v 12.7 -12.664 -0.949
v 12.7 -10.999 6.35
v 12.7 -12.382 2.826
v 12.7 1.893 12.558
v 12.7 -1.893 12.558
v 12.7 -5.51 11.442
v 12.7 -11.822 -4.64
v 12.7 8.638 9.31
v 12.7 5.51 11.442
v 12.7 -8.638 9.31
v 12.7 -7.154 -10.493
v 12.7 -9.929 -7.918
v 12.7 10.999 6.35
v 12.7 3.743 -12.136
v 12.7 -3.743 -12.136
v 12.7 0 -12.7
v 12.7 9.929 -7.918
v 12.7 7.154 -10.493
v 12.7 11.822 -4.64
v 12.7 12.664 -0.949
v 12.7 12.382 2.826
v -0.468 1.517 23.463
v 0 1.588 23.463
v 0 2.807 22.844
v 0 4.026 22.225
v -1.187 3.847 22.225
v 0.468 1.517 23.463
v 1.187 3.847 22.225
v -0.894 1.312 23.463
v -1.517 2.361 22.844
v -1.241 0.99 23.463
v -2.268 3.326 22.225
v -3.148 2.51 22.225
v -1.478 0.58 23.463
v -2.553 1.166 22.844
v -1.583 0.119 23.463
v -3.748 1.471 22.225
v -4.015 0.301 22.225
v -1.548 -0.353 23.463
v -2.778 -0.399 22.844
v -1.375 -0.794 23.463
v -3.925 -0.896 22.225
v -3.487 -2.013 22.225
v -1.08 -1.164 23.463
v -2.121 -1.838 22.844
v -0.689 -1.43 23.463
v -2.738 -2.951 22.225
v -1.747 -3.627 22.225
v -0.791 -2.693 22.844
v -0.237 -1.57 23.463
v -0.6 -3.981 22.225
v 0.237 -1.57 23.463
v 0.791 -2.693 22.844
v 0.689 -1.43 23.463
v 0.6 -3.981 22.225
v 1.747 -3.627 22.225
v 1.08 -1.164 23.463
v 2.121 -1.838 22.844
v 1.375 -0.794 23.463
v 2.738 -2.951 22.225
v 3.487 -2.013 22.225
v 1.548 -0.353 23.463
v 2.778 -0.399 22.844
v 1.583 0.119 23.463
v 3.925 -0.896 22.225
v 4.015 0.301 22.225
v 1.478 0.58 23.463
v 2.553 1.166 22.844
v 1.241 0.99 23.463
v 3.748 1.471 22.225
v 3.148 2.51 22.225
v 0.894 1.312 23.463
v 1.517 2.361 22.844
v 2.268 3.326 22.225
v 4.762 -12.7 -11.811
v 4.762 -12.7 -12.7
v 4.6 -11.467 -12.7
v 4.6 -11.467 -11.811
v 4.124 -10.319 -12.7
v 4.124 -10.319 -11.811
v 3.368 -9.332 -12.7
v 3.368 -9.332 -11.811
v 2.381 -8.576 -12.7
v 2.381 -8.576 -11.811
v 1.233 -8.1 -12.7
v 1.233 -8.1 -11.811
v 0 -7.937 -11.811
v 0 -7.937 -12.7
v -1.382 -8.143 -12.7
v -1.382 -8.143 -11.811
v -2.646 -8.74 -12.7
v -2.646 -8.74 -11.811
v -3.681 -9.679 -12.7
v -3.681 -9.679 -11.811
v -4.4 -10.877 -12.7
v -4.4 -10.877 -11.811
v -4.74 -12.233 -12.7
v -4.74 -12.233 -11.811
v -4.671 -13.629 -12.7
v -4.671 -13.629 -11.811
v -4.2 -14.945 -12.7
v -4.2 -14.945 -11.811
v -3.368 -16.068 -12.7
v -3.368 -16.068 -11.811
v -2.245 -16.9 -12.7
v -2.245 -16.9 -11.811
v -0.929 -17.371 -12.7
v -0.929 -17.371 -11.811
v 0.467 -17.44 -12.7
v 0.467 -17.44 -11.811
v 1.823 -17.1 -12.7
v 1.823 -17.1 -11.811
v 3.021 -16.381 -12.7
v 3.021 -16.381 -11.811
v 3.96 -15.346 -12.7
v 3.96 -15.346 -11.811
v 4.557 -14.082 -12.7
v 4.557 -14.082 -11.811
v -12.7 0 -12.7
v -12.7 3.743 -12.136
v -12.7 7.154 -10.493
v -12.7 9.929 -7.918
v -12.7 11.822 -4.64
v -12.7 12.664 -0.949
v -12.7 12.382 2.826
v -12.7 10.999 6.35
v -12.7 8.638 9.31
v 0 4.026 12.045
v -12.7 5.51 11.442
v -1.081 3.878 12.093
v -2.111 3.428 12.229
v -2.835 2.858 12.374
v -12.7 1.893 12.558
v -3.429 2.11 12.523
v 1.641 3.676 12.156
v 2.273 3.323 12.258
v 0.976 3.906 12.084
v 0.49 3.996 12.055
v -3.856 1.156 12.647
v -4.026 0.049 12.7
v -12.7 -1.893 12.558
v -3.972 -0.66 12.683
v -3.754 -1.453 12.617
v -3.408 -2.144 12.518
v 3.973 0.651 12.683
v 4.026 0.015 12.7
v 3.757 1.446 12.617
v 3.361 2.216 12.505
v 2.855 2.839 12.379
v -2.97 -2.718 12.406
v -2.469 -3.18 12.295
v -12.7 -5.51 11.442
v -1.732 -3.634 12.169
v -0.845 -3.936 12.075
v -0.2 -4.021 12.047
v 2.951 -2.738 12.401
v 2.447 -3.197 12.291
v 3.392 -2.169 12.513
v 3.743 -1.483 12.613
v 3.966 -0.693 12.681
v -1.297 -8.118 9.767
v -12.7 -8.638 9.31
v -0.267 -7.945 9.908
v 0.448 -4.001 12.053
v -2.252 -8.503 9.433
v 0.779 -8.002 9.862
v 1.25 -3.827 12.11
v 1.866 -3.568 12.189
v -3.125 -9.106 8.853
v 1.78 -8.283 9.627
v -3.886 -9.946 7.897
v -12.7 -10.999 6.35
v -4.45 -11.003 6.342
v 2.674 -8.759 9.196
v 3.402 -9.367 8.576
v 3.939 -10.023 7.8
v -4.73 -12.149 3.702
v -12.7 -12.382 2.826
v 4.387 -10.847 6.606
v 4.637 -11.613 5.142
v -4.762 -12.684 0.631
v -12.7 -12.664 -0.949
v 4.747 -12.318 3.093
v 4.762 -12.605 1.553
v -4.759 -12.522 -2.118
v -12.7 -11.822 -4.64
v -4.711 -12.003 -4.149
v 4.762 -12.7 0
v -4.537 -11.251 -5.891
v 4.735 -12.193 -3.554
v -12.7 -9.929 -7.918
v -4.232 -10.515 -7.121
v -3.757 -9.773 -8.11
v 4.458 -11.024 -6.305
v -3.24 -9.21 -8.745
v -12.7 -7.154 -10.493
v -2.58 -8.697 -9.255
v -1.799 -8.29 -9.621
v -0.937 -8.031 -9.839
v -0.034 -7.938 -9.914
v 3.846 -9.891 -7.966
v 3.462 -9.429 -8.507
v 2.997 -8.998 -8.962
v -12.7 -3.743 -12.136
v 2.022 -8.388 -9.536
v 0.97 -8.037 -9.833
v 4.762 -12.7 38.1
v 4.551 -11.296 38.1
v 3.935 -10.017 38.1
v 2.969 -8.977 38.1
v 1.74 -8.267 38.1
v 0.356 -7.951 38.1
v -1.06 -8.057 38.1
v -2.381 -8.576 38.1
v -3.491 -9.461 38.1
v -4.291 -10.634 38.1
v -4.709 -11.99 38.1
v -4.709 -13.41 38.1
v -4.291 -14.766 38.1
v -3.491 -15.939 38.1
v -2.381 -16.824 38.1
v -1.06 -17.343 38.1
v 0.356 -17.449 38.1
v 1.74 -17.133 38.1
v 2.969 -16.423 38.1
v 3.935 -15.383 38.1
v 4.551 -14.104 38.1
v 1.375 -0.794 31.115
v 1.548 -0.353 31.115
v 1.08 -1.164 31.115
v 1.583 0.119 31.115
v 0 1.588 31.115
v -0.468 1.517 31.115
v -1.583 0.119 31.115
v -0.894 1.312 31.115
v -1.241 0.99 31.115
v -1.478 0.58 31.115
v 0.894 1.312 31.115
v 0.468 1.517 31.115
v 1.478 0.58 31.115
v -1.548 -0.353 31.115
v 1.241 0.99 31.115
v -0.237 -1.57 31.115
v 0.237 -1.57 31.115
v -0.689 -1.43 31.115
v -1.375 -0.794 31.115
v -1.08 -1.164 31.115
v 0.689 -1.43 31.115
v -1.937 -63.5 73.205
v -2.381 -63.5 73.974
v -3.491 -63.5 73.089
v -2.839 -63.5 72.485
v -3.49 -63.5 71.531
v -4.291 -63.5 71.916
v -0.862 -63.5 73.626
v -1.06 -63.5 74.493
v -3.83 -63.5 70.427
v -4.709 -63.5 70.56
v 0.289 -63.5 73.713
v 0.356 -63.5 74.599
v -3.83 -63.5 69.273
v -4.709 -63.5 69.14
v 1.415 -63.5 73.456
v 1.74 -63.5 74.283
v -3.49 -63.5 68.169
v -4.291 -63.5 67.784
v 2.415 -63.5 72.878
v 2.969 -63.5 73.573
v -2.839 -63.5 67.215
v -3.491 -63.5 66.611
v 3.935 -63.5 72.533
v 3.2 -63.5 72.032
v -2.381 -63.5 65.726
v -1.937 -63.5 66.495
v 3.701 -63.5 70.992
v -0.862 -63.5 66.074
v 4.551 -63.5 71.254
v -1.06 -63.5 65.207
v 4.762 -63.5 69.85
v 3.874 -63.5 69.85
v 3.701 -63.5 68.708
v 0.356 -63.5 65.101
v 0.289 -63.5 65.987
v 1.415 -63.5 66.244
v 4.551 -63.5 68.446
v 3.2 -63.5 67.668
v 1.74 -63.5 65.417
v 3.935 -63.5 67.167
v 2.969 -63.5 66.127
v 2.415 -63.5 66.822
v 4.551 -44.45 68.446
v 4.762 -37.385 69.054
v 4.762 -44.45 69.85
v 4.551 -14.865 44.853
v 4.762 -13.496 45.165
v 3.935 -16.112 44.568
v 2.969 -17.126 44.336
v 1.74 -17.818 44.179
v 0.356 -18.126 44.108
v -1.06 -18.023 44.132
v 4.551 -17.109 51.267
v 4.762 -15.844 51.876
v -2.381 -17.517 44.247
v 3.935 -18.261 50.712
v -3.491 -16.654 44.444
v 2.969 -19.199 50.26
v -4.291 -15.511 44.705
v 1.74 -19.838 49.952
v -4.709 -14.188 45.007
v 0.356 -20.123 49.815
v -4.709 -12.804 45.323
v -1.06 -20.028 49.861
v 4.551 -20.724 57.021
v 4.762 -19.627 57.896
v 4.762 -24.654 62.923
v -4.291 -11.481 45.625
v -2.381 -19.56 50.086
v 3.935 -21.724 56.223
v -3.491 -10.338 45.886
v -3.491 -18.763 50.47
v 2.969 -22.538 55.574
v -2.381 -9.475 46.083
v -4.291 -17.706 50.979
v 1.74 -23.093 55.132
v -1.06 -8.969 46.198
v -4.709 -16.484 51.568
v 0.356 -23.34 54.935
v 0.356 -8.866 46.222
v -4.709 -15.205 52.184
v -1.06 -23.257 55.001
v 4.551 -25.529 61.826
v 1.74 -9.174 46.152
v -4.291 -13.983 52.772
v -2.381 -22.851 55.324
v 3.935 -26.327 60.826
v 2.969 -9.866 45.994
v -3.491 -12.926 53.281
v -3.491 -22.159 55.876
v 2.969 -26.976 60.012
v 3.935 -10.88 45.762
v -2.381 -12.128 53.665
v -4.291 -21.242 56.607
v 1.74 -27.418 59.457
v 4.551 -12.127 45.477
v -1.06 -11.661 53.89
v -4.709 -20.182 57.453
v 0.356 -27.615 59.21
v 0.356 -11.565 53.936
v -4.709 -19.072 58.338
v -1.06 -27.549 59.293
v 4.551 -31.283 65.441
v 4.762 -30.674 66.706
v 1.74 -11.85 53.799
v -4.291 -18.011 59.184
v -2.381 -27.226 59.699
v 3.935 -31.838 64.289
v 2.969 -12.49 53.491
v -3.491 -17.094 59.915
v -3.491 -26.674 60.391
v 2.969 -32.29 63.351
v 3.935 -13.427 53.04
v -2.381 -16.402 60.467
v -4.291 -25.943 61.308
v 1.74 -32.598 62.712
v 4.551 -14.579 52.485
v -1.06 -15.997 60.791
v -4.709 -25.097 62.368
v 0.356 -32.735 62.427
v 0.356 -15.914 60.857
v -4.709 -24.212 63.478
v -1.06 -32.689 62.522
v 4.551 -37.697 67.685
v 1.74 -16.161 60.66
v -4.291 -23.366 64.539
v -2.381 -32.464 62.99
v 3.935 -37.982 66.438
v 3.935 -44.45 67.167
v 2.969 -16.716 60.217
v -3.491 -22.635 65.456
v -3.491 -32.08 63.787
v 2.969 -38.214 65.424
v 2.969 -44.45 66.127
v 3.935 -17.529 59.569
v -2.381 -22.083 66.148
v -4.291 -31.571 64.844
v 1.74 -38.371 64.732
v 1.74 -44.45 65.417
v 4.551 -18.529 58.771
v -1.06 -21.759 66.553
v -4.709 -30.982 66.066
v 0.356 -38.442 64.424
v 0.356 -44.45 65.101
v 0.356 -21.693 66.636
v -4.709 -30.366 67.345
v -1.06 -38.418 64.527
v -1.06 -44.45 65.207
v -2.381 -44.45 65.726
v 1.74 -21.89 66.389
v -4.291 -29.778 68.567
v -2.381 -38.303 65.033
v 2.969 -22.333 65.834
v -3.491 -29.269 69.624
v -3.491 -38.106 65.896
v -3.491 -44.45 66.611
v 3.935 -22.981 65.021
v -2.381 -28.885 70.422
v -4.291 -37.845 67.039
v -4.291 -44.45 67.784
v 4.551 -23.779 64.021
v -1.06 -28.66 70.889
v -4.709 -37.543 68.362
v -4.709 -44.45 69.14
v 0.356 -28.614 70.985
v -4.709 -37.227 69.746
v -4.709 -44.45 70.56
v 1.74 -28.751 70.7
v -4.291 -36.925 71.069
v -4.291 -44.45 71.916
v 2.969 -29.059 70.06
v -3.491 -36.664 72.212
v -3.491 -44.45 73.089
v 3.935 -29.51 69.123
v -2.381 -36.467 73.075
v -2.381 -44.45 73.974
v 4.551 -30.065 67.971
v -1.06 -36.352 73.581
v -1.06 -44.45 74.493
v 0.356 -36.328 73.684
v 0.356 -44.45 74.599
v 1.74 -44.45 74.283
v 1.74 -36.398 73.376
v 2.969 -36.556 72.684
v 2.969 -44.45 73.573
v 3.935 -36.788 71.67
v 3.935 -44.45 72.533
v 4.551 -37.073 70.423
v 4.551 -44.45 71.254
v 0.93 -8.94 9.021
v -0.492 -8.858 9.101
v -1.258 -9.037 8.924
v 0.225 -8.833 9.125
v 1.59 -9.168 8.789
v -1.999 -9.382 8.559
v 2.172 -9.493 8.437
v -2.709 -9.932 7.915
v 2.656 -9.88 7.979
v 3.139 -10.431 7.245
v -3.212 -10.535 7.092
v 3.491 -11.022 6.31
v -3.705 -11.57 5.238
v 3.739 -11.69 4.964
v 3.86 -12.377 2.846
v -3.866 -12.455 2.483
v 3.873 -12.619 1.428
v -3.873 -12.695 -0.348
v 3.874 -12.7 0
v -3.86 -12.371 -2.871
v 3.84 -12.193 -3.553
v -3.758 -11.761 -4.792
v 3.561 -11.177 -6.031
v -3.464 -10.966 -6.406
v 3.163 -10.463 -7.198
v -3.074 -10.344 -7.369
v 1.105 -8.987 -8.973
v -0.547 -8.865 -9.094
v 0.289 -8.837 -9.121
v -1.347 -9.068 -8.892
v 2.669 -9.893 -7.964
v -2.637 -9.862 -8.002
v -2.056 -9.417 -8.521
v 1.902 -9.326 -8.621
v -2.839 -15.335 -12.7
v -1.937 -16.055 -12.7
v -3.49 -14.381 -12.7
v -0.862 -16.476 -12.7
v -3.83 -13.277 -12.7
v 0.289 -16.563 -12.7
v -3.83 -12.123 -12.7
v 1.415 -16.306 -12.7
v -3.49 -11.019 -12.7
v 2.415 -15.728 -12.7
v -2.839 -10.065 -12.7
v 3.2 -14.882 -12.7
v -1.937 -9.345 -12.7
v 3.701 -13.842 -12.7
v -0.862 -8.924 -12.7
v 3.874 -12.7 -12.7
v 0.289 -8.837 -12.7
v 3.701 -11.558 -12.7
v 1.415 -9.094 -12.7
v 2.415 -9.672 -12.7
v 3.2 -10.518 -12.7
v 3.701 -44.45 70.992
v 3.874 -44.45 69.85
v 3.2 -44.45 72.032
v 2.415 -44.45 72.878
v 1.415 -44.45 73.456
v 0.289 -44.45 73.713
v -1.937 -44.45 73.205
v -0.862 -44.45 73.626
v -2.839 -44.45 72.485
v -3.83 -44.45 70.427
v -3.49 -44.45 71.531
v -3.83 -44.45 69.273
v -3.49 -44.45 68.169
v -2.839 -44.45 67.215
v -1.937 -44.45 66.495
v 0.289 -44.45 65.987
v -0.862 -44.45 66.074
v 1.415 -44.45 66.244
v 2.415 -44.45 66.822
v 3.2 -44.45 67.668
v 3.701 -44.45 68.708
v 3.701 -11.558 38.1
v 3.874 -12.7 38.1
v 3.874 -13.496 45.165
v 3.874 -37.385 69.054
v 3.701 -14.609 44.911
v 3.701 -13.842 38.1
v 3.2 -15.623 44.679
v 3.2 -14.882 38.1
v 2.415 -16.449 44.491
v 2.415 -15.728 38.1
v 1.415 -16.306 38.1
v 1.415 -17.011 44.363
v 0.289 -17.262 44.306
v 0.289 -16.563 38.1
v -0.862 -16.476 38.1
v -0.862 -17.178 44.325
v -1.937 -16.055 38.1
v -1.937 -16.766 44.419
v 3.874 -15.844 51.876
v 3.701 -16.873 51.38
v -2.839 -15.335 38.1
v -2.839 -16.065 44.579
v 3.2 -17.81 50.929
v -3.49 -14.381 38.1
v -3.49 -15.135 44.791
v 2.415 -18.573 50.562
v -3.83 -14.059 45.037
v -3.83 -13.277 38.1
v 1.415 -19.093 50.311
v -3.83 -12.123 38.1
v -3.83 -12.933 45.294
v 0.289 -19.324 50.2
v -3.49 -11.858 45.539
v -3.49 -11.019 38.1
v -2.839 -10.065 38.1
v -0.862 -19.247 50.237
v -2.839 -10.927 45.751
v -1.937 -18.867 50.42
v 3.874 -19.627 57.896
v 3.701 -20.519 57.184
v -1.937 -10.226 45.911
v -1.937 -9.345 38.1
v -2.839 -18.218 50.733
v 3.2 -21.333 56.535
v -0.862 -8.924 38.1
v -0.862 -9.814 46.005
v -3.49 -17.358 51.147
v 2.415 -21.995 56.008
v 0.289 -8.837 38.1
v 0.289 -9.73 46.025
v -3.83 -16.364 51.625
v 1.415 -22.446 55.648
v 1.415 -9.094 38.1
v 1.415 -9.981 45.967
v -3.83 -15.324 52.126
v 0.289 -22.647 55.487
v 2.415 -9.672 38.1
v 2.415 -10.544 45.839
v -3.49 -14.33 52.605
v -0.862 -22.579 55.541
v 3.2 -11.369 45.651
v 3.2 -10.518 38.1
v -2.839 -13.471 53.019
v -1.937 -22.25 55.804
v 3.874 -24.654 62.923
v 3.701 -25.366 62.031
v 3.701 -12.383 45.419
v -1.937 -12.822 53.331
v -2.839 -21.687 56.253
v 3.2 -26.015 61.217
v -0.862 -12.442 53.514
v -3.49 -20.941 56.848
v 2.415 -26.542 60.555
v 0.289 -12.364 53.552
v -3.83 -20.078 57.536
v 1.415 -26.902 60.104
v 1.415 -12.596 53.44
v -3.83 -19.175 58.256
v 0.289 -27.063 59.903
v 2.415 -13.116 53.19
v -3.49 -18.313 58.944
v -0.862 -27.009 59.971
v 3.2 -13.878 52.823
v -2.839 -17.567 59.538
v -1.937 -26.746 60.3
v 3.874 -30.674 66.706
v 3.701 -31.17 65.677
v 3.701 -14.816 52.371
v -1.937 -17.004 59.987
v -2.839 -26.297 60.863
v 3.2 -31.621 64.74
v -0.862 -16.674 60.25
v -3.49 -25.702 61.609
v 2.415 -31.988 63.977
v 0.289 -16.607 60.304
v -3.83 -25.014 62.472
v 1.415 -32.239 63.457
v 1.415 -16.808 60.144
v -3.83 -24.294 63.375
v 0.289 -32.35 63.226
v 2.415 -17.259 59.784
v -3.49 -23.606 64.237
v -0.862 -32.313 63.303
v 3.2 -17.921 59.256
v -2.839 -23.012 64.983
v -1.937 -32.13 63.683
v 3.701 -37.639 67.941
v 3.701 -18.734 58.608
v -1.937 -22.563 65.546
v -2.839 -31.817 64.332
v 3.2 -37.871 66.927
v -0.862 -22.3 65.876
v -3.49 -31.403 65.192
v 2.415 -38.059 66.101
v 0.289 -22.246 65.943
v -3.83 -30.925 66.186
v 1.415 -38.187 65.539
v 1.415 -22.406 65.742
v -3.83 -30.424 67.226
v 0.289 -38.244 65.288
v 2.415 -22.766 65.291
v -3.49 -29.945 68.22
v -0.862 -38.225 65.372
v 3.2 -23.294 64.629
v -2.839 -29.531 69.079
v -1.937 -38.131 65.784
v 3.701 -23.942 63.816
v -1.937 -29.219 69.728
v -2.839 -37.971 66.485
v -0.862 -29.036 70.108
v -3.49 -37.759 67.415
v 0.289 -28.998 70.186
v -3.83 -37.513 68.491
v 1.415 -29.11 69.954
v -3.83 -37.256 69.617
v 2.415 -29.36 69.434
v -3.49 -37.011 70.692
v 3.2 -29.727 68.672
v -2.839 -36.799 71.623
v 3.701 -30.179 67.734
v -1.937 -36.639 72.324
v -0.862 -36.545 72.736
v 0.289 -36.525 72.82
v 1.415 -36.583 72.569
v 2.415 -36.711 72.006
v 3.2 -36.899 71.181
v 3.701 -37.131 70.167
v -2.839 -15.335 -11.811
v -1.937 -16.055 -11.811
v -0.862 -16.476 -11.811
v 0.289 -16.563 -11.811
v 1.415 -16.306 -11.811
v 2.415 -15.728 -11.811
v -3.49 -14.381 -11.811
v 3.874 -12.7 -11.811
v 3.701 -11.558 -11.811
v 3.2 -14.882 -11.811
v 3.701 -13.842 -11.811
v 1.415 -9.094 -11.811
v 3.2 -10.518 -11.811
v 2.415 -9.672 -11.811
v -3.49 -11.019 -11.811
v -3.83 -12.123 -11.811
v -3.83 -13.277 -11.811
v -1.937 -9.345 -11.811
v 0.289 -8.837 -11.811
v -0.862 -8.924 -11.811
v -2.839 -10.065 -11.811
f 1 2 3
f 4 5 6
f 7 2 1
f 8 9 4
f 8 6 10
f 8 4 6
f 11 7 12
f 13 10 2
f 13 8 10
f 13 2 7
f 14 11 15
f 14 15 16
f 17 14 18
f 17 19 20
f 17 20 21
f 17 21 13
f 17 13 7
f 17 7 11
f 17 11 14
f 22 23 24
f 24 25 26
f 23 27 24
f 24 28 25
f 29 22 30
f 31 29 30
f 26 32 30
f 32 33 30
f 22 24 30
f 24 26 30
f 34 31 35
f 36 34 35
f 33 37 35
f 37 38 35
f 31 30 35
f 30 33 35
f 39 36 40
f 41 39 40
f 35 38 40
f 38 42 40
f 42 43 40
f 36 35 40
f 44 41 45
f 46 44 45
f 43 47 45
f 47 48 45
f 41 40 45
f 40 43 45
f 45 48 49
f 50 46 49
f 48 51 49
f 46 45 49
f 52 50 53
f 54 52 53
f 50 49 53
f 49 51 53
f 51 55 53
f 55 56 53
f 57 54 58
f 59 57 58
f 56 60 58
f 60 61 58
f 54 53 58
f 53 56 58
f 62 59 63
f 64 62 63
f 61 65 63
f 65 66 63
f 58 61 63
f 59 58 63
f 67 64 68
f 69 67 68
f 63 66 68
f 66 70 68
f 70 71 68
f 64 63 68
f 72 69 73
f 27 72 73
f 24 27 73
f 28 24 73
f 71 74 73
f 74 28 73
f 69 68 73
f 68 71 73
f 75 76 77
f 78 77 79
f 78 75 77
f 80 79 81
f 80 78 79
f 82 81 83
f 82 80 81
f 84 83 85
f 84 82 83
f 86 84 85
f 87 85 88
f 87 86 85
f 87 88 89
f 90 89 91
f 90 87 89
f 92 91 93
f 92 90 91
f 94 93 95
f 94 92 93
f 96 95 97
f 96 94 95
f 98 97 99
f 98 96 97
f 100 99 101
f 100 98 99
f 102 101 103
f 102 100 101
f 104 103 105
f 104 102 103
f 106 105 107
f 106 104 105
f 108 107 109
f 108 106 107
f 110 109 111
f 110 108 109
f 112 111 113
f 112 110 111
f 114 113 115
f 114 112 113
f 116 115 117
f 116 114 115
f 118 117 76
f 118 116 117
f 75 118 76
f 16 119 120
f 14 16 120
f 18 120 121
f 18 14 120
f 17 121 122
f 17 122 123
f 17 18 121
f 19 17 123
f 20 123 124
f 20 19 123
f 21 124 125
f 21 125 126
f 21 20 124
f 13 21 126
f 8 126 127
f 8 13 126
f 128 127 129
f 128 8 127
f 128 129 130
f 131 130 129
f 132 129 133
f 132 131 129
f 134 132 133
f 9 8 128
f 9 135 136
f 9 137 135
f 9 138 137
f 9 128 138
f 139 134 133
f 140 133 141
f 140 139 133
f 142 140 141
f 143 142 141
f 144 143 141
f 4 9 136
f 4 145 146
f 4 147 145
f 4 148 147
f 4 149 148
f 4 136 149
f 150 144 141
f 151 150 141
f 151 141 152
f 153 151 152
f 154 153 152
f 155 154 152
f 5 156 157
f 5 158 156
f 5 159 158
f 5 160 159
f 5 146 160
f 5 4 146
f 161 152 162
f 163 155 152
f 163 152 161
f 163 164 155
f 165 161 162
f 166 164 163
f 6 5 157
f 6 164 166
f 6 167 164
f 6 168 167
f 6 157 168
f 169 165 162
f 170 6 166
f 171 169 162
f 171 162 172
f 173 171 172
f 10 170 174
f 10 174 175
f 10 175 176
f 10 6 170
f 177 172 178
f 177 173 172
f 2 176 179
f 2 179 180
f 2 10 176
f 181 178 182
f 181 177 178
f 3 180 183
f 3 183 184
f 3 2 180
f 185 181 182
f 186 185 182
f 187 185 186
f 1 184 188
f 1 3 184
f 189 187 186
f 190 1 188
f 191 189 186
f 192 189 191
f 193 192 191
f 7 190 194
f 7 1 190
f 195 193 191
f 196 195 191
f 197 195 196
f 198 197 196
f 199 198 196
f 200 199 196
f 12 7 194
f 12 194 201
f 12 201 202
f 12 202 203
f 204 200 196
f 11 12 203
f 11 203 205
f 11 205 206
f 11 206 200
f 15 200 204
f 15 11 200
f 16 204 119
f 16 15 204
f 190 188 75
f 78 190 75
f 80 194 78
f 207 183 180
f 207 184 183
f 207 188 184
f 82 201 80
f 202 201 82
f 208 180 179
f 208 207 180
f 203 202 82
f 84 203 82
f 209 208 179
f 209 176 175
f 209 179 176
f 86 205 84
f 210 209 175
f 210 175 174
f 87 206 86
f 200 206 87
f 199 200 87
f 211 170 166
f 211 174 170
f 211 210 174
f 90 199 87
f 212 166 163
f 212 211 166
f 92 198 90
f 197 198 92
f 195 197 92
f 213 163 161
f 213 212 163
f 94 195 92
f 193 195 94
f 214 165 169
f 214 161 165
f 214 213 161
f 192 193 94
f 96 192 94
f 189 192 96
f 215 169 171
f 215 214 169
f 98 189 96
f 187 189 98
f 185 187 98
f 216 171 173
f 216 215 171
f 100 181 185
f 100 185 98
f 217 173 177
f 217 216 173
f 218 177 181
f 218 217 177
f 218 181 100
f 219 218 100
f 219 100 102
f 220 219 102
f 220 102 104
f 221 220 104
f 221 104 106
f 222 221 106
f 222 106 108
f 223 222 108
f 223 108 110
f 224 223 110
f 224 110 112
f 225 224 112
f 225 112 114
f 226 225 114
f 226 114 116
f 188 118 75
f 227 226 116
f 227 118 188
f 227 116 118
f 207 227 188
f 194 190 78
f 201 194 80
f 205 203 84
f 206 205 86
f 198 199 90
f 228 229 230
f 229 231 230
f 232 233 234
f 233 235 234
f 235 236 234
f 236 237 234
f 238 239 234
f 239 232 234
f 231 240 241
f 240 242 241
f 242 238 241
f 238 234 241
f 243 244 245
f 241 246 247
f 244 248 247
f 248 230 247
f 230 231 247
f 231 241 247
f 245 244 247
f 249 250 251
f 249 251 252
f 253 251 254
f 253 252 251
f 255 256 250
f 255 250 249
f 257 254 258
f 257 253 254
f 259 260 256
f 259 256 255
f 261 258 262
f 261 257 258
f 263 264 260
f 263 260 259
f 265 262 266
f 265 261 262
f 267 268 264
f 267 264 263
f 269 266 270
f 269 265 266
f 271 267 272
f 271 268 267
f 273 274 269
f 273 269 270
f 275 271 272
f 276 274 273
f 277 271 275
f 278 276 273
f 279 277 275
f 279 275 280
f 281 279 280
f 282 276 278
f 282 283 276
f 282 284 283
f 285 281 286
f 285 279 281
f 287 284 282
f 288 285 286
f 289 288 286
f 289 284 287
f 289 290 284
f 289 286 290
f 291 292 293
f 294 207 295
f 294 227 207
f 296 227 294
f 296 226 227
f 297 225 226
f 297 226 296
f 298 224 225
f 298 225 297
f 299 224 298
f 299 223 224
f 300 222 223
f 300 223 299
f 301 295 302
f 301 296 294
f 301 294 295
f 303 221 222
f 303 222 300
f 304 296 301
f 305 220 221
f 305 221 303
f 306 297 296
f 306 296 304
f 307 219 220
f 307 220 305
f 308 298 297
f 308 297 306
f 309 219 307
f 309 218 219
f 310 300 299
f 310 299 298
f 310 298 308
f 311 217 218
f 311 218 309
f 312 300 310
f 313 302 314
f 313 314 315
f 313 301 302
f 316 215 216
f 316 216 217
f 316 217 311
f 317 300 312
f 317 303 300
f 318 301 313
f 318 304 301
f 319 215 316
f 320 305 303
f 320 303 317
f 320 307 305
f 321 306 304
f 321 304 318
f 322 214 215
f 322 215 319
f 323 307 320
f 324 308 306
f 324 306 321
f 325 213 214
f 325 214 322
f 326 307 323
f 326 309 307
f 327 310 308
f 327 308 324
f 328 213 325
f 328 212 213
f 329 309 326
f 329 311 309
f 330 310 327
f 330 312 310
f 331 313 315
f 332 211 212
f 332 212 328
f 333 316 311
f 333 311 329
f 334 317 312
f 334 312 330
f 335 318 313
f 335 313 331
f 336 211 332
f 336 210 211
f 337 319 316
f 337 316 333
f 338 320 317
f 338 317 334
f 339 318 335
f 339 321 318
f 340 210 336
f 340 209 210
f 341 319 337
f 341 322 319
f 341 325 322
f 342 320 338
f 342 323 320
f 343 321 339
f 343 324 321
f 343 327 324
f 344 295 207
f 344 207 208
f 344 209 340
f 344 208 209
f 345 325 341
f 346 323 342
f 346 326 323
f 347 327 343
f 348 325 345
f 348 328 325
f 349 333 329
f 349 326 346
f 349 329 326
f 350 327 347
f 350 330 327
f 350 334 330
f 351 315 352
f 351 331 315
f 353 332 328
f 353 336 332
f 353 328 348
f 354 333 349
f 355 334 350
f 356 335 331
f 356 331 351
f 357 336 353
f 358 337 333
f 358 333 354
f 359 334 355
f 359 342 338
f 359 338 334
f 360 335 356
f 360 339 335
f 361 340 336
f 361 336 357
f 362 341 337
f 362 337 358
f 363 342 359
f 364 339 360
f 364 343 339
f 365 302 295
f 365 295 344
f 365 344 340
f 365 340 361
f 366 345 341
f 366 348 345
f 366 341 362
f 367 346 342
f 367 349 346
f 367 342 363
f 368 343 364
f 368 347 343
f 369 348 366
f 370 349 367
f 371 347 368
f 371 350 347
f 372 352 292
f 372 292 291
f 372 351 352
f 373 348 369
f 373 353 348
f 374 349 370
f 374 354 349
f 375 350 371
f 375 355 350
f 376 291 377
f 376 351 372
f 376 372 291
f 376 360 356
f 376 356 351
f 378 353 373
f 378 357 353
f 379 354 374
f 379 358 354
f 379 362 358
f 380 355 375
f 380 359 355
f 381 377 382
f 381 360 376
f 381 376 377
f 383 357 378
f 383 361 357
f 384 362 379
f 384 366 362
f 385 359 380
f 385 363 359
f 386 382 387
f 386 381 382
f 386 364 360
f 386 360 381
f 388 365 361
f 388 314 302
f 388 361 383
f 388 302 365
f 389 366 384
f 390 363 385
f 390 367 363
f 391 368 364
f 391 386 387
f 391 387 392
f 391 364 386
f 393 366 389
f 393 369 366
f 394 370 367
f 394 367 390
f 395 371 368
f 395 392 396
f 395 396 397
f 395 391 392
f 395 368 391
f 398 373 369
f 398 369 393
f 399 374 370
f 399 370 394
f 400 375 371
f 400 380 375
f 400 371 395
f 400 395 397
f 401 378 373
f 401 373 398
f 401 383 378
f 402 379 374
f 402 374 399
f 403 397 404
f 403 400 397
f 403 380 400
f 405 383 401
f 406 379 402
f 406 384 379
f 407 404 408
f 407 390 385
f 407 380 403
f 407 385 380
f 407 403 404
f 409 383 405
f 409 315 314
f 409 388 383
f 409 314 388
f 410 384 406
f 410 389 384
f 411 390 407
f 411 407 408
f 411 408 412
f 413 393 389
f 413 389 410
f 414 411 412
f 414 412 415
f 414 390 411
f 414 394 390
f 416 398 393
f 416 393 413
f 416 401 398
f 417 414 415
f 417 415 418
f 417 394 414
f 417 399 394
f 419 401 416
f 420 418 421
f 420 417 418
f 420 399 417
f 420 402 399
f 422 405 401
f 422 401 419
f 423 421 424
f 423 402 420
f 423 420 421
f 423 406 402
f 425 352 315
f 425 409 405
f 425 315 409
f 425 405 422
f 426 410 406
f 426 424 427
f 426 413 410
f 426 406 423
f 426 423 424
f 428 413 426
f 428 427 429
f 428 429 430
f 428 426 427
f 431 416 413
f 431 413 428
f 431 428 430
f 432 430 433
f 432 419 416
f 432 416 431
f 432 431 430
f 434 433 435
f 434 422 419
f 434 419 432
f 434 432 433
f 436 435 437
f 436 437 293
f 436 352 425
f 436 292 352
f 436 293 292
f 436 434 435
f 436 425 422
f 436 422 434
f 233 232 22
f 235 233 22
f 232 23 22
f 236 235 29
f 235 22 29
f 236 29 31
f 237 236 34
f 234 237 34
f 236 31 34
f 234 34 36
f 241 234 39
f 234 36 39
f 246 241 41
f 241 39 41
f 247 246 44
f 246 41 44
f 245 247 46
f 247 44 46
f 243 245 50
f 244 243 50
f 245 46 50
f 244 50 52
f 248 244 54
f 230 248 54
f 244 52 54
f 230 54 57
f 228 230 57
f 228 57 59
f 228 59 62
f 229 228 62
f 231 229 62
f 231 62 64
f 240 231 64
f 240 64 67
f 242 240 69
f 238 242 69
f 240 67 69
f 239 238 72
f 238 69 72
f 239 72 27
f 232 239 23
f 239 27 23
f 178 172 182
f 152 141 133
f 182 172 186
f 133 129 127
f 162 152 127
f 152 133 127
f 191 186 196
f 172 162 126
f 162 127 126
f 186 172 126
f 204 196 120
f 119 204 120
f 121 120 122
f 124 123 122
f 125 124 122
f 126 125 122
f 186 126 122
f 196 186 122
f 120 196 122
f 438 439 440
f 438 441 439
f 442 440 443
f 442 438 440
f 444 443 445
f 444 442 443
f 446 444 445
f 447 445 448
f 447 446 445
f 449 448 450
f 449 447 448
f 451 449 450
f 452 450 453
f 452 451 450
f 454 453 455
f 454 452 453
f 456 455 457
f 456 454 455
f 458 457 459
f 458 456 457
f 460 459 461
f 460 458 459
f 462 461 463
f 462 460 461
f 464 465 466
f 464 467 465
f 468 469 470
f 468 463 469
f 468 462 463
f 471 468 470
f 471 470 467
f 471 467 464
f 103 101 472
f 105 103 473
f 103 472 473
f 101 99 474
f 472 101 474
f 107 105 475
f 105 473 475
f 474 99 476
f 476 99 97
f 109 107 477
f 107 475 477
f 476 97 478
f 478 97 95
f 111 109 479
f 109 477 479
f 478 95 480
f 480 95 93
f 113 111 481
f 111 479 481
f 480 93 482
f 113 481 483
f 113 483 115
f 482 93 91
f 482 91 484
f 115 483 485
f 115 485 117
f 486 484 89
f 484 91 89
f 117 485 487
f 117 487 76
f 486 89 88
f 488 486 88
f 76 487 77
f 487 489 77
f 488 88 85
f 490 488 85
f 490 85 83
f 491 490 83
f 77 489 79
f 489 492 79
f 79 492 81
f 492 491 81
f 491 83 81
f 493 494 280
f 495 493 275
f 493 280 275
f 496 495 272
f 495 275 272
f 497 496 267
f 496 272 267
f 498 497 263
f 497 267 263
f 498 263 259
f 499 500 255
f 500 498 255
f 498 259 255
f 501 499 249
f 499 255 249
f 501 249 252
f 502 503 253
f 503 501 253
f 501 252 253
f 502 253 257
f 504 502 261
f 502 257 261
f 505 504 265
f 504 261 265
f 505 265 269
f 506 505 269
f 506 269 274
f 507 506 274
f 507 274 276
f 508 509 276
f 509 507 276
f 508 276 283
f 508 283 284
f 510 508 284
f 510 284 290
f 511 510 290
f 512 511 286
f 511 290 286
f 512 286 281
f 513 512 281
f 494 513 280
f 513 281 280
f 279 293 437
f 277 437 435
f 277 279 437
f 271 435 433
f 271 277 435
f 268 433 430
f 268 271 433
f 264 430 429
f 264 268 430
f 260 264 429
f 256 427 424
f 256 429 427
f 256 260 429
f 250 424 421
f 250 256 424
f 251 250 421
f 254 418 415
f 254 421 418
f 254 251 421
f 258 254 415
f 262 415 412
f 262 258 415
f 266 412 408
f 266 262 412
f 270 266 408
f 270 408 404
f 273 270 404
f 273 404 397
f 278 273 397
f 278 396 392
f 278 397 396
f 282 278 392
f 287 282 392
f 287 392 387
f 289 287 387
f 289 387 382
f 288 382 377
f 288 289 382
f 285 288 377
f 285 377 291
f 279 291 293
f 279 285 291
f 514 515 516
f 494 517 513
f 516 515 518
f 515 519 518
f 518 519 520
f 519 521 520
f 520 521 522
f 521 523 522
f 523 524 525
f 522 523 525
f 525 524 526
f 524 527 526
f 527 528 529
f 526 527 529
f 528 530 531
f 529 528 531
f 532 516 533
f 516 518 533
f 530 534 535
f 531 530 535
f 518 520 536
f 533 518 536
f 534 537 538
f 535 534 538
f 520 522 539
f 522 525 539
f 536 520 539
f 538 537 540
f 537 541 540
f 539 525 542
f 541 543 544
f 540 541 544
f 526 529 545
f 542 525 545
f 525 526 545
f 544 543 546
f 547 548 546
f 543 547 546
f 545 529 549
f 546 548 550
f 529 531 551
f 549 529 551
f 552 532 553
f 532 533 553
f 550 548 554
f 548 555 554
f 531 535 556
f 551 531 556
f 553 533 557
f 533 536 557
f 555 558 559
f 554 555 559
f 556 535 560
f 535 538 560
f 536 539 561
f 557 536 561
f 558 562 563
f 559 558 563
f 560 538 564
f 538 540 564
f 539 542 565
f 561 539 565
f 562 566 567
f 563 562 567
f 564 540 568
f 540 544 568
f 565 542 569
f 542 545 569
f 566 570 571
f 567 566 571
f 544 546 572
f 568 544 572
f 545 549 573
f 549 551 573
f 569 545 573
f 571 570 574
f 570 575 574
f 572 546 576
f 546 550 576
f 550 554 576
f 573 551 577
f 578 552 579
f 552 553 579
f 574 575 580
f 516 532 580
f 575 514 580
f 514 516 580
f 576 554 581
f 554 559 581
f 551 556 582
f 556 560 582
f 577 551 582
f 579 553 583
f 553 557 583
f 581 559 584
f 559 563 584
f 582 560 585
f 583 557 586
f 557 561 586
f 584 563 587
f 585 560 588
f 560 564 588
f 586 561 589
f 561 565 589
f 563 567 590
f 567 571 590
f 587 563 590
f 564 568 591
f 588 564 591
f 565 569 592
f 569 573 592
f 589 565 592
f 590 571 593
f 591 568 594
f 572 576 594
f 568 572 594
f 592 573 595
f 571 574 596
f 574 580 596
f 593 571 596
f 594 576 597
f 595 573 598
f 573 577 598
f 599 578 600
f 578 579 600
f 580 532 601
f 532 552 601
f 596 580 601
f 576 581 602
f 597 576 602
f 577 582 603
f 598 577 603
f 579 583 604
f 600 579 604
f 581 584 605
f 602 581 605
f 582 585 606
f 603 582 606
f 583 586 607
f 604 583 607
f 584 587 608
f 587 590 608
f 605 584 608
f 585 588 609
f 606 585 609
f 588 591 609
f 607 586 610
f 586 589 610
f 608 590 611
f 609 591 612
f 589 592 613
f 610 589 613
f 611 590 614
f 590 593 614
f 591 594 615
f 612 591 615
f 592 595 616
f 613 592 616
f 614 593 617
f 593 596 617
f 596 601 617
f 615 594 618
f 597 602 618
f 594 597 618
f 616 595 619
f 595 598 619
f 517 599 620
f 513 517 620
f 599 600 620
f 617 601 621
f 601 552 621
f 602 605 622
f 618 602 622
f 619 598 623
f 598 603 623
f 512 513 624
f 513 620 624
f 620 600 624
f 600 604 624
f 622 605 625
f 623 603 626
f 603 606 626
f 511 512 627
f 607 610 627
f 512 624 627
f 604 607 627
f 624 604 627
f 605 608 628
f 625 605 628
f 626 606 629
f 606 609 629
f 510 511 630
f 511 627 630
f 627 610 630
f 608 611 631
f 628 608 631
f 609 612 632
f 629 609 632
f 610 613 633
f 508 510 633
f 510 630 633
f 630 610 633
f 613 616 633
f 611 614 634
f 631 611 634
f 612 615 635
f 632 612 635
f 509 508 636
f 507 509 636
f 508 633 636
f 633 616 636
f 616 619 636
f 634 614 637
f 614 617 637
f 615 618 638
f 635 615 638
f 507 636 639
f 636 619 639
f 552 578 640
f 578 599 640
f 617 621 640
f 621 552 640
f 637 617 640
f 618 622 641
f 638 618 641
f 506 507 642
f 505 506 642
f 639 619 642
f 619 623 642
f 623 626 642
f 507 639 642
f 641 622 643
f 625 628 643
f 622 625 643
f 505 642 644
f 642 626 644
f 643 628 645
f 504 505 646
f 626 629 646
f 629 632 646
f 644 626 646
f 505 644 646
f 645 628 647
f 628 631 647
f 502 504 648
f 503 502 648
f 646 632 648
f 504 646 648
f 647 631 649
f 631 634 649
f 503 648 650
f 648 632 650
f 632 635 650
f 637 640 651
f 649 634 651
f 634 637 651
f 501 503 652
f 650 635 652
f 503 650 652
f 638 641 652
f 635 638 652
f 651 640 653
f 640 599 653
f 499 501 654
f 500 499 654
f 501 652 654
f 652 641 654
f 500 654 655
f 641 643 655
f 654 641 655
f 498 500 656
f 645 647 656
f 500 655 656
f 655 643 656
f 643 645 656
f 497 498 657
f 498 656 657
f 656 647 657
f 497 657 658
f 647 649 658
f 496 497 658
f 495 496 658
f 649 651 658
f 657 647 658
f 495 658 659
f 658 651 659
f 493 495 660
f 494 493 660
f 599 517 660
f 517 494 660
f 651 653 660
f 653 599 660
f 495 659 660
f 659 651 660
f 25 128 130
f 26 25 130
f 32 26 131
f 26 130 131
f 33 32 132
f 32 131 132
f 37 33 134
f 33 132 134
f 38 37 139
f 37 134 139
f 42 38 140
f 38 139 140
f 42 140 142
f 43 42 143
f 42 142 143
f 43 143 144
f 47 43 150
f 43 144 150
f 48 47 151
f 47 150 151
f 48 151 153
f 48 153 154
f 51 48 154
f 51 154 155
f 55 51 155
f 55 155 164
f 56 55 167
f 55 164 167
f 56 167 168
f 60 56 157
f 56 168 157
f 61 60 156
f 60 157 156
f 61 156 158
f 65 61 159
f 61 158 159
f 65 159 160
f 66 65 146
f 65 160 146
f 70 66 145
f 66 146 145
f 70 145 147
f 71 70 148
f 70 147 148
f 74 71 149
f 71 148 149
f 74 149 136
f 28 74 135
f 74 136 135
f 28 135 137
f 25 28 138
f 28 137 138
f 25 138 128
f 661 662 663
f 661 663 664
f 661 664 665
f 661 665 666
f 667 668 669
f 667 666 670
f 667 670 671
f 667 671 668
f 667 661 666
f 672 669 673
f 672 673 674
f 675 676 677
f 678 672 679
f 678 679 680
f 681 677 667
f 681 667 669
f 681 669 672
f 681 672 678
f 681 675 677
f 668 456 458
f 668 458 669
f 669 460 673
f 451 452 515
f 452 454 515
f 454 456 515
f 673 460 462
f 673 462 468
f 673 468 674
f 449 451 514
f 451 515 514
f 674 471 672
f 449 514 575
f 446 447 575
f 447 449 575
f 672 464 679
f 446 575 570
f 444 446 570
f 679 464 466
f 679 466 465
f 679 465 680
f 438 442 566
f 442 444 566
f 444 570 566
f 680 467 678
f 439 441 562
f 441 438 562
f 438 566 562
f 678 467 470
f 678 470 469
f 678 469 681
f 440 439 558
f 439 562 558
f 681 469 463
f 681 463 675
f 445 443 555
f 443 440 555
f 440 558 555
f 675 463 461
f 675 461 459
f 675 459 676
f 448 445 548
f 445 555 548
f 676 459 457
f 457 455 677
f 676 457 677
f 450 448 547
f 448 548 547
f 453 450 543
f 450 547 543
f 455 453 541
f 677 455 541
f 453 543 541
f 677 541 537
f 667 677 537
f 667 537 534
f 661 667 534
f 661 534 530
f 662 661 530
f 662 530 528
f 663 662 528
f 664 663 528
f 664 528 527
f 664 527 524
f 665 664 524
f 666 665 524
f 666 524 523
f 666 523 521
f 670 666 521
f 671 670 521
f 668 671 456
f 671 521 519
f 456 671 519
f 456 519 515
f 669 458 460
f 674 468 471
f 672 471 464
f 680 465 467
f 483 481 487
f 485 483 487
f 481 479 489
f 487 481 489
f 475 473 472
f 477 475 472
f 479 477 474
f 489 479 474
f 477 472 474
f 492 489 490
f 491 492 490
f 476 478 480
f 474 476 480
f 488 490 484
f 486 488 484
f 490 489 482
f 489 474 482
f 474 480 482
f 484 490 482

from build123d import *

# Parameters (mm, degrees)
SKETCH1_R      = 12.7
EXTRUDE1_DEPTH = 12.7
SKETCH2_R      = 4.7625
SKETCH2_R_2    = 3.8735
EXTRUDE2_START = 0.889
SKETCH4_R      = 4.7625
EXTRUDE2_DEPTH = 0.889


with BuildPart() as part:
    # Sketch1 → Extrude1 (new, symmetric)
    with BuildSketch(Plane(origin=(0, 0, 0), x_dir=(0, 0, -1), z_dir=(1, 0, 0))):
        Circle(SKETCH1_R)
    extrude(amount=EXTRUDE1_DEPTH, both=True)

    # Sweep1: sweep along a path in Sketch3
    with BuildLine(Plane(origin=(0, 0, 0), x_dir=(0, 0, -1), z_dir=(1, 0, 0))) as sweep1_path:
        Line((12.7, -12.7), (-38.1, -12.7))
        ThreePointArc((-38.1, -12.7), (-60.550640303, -21.999359697), (-69.85, -44.45))
        Line((-69.85, -44.45), (-69.85, -63.5))
    # Sketch2 → Sweep1 (sweep)
    with BuildSketch(Plane.XY.offset(-12.7)):
        with Locations((0, -12.7)):
            Circle(SKETCH2_R)
        with Locations((0, -12.7)):
            Circle(SKETCH2_R_2, mode=Mode.SUBTRACT)
    sweep(path=sweep1_path.line)

    # Sketch4 → Extrude2 (add)
    with BuildSketch(Plane.XY.offset(-12.7).offset(EXTRUDE2_START)):
        with Locations(Location((0, -12.7, 0), (0, 0, 90))):
            Circle(SKETCH4_R)
    extrude(amount=-EXTRUDE2_DEPTH)

    # Sketch5 → Revolve1 (revolve)
    with BuildSketch(Plane(origin=(0, 0, 0), x_dir=(0, 0, -1), z_dir=(1, 0, 0))):
        Polygon((-10.16, 0), (-31.115, 0), (-31.115, 1.5875), (-23.462887774, 1.5875), (-22.225, 4.0259), (-10.16, 4.0259), align=None)
    revolve(axis=Axis((0, 0, 31.115), (0, 0, 1)))


solid = part.part
